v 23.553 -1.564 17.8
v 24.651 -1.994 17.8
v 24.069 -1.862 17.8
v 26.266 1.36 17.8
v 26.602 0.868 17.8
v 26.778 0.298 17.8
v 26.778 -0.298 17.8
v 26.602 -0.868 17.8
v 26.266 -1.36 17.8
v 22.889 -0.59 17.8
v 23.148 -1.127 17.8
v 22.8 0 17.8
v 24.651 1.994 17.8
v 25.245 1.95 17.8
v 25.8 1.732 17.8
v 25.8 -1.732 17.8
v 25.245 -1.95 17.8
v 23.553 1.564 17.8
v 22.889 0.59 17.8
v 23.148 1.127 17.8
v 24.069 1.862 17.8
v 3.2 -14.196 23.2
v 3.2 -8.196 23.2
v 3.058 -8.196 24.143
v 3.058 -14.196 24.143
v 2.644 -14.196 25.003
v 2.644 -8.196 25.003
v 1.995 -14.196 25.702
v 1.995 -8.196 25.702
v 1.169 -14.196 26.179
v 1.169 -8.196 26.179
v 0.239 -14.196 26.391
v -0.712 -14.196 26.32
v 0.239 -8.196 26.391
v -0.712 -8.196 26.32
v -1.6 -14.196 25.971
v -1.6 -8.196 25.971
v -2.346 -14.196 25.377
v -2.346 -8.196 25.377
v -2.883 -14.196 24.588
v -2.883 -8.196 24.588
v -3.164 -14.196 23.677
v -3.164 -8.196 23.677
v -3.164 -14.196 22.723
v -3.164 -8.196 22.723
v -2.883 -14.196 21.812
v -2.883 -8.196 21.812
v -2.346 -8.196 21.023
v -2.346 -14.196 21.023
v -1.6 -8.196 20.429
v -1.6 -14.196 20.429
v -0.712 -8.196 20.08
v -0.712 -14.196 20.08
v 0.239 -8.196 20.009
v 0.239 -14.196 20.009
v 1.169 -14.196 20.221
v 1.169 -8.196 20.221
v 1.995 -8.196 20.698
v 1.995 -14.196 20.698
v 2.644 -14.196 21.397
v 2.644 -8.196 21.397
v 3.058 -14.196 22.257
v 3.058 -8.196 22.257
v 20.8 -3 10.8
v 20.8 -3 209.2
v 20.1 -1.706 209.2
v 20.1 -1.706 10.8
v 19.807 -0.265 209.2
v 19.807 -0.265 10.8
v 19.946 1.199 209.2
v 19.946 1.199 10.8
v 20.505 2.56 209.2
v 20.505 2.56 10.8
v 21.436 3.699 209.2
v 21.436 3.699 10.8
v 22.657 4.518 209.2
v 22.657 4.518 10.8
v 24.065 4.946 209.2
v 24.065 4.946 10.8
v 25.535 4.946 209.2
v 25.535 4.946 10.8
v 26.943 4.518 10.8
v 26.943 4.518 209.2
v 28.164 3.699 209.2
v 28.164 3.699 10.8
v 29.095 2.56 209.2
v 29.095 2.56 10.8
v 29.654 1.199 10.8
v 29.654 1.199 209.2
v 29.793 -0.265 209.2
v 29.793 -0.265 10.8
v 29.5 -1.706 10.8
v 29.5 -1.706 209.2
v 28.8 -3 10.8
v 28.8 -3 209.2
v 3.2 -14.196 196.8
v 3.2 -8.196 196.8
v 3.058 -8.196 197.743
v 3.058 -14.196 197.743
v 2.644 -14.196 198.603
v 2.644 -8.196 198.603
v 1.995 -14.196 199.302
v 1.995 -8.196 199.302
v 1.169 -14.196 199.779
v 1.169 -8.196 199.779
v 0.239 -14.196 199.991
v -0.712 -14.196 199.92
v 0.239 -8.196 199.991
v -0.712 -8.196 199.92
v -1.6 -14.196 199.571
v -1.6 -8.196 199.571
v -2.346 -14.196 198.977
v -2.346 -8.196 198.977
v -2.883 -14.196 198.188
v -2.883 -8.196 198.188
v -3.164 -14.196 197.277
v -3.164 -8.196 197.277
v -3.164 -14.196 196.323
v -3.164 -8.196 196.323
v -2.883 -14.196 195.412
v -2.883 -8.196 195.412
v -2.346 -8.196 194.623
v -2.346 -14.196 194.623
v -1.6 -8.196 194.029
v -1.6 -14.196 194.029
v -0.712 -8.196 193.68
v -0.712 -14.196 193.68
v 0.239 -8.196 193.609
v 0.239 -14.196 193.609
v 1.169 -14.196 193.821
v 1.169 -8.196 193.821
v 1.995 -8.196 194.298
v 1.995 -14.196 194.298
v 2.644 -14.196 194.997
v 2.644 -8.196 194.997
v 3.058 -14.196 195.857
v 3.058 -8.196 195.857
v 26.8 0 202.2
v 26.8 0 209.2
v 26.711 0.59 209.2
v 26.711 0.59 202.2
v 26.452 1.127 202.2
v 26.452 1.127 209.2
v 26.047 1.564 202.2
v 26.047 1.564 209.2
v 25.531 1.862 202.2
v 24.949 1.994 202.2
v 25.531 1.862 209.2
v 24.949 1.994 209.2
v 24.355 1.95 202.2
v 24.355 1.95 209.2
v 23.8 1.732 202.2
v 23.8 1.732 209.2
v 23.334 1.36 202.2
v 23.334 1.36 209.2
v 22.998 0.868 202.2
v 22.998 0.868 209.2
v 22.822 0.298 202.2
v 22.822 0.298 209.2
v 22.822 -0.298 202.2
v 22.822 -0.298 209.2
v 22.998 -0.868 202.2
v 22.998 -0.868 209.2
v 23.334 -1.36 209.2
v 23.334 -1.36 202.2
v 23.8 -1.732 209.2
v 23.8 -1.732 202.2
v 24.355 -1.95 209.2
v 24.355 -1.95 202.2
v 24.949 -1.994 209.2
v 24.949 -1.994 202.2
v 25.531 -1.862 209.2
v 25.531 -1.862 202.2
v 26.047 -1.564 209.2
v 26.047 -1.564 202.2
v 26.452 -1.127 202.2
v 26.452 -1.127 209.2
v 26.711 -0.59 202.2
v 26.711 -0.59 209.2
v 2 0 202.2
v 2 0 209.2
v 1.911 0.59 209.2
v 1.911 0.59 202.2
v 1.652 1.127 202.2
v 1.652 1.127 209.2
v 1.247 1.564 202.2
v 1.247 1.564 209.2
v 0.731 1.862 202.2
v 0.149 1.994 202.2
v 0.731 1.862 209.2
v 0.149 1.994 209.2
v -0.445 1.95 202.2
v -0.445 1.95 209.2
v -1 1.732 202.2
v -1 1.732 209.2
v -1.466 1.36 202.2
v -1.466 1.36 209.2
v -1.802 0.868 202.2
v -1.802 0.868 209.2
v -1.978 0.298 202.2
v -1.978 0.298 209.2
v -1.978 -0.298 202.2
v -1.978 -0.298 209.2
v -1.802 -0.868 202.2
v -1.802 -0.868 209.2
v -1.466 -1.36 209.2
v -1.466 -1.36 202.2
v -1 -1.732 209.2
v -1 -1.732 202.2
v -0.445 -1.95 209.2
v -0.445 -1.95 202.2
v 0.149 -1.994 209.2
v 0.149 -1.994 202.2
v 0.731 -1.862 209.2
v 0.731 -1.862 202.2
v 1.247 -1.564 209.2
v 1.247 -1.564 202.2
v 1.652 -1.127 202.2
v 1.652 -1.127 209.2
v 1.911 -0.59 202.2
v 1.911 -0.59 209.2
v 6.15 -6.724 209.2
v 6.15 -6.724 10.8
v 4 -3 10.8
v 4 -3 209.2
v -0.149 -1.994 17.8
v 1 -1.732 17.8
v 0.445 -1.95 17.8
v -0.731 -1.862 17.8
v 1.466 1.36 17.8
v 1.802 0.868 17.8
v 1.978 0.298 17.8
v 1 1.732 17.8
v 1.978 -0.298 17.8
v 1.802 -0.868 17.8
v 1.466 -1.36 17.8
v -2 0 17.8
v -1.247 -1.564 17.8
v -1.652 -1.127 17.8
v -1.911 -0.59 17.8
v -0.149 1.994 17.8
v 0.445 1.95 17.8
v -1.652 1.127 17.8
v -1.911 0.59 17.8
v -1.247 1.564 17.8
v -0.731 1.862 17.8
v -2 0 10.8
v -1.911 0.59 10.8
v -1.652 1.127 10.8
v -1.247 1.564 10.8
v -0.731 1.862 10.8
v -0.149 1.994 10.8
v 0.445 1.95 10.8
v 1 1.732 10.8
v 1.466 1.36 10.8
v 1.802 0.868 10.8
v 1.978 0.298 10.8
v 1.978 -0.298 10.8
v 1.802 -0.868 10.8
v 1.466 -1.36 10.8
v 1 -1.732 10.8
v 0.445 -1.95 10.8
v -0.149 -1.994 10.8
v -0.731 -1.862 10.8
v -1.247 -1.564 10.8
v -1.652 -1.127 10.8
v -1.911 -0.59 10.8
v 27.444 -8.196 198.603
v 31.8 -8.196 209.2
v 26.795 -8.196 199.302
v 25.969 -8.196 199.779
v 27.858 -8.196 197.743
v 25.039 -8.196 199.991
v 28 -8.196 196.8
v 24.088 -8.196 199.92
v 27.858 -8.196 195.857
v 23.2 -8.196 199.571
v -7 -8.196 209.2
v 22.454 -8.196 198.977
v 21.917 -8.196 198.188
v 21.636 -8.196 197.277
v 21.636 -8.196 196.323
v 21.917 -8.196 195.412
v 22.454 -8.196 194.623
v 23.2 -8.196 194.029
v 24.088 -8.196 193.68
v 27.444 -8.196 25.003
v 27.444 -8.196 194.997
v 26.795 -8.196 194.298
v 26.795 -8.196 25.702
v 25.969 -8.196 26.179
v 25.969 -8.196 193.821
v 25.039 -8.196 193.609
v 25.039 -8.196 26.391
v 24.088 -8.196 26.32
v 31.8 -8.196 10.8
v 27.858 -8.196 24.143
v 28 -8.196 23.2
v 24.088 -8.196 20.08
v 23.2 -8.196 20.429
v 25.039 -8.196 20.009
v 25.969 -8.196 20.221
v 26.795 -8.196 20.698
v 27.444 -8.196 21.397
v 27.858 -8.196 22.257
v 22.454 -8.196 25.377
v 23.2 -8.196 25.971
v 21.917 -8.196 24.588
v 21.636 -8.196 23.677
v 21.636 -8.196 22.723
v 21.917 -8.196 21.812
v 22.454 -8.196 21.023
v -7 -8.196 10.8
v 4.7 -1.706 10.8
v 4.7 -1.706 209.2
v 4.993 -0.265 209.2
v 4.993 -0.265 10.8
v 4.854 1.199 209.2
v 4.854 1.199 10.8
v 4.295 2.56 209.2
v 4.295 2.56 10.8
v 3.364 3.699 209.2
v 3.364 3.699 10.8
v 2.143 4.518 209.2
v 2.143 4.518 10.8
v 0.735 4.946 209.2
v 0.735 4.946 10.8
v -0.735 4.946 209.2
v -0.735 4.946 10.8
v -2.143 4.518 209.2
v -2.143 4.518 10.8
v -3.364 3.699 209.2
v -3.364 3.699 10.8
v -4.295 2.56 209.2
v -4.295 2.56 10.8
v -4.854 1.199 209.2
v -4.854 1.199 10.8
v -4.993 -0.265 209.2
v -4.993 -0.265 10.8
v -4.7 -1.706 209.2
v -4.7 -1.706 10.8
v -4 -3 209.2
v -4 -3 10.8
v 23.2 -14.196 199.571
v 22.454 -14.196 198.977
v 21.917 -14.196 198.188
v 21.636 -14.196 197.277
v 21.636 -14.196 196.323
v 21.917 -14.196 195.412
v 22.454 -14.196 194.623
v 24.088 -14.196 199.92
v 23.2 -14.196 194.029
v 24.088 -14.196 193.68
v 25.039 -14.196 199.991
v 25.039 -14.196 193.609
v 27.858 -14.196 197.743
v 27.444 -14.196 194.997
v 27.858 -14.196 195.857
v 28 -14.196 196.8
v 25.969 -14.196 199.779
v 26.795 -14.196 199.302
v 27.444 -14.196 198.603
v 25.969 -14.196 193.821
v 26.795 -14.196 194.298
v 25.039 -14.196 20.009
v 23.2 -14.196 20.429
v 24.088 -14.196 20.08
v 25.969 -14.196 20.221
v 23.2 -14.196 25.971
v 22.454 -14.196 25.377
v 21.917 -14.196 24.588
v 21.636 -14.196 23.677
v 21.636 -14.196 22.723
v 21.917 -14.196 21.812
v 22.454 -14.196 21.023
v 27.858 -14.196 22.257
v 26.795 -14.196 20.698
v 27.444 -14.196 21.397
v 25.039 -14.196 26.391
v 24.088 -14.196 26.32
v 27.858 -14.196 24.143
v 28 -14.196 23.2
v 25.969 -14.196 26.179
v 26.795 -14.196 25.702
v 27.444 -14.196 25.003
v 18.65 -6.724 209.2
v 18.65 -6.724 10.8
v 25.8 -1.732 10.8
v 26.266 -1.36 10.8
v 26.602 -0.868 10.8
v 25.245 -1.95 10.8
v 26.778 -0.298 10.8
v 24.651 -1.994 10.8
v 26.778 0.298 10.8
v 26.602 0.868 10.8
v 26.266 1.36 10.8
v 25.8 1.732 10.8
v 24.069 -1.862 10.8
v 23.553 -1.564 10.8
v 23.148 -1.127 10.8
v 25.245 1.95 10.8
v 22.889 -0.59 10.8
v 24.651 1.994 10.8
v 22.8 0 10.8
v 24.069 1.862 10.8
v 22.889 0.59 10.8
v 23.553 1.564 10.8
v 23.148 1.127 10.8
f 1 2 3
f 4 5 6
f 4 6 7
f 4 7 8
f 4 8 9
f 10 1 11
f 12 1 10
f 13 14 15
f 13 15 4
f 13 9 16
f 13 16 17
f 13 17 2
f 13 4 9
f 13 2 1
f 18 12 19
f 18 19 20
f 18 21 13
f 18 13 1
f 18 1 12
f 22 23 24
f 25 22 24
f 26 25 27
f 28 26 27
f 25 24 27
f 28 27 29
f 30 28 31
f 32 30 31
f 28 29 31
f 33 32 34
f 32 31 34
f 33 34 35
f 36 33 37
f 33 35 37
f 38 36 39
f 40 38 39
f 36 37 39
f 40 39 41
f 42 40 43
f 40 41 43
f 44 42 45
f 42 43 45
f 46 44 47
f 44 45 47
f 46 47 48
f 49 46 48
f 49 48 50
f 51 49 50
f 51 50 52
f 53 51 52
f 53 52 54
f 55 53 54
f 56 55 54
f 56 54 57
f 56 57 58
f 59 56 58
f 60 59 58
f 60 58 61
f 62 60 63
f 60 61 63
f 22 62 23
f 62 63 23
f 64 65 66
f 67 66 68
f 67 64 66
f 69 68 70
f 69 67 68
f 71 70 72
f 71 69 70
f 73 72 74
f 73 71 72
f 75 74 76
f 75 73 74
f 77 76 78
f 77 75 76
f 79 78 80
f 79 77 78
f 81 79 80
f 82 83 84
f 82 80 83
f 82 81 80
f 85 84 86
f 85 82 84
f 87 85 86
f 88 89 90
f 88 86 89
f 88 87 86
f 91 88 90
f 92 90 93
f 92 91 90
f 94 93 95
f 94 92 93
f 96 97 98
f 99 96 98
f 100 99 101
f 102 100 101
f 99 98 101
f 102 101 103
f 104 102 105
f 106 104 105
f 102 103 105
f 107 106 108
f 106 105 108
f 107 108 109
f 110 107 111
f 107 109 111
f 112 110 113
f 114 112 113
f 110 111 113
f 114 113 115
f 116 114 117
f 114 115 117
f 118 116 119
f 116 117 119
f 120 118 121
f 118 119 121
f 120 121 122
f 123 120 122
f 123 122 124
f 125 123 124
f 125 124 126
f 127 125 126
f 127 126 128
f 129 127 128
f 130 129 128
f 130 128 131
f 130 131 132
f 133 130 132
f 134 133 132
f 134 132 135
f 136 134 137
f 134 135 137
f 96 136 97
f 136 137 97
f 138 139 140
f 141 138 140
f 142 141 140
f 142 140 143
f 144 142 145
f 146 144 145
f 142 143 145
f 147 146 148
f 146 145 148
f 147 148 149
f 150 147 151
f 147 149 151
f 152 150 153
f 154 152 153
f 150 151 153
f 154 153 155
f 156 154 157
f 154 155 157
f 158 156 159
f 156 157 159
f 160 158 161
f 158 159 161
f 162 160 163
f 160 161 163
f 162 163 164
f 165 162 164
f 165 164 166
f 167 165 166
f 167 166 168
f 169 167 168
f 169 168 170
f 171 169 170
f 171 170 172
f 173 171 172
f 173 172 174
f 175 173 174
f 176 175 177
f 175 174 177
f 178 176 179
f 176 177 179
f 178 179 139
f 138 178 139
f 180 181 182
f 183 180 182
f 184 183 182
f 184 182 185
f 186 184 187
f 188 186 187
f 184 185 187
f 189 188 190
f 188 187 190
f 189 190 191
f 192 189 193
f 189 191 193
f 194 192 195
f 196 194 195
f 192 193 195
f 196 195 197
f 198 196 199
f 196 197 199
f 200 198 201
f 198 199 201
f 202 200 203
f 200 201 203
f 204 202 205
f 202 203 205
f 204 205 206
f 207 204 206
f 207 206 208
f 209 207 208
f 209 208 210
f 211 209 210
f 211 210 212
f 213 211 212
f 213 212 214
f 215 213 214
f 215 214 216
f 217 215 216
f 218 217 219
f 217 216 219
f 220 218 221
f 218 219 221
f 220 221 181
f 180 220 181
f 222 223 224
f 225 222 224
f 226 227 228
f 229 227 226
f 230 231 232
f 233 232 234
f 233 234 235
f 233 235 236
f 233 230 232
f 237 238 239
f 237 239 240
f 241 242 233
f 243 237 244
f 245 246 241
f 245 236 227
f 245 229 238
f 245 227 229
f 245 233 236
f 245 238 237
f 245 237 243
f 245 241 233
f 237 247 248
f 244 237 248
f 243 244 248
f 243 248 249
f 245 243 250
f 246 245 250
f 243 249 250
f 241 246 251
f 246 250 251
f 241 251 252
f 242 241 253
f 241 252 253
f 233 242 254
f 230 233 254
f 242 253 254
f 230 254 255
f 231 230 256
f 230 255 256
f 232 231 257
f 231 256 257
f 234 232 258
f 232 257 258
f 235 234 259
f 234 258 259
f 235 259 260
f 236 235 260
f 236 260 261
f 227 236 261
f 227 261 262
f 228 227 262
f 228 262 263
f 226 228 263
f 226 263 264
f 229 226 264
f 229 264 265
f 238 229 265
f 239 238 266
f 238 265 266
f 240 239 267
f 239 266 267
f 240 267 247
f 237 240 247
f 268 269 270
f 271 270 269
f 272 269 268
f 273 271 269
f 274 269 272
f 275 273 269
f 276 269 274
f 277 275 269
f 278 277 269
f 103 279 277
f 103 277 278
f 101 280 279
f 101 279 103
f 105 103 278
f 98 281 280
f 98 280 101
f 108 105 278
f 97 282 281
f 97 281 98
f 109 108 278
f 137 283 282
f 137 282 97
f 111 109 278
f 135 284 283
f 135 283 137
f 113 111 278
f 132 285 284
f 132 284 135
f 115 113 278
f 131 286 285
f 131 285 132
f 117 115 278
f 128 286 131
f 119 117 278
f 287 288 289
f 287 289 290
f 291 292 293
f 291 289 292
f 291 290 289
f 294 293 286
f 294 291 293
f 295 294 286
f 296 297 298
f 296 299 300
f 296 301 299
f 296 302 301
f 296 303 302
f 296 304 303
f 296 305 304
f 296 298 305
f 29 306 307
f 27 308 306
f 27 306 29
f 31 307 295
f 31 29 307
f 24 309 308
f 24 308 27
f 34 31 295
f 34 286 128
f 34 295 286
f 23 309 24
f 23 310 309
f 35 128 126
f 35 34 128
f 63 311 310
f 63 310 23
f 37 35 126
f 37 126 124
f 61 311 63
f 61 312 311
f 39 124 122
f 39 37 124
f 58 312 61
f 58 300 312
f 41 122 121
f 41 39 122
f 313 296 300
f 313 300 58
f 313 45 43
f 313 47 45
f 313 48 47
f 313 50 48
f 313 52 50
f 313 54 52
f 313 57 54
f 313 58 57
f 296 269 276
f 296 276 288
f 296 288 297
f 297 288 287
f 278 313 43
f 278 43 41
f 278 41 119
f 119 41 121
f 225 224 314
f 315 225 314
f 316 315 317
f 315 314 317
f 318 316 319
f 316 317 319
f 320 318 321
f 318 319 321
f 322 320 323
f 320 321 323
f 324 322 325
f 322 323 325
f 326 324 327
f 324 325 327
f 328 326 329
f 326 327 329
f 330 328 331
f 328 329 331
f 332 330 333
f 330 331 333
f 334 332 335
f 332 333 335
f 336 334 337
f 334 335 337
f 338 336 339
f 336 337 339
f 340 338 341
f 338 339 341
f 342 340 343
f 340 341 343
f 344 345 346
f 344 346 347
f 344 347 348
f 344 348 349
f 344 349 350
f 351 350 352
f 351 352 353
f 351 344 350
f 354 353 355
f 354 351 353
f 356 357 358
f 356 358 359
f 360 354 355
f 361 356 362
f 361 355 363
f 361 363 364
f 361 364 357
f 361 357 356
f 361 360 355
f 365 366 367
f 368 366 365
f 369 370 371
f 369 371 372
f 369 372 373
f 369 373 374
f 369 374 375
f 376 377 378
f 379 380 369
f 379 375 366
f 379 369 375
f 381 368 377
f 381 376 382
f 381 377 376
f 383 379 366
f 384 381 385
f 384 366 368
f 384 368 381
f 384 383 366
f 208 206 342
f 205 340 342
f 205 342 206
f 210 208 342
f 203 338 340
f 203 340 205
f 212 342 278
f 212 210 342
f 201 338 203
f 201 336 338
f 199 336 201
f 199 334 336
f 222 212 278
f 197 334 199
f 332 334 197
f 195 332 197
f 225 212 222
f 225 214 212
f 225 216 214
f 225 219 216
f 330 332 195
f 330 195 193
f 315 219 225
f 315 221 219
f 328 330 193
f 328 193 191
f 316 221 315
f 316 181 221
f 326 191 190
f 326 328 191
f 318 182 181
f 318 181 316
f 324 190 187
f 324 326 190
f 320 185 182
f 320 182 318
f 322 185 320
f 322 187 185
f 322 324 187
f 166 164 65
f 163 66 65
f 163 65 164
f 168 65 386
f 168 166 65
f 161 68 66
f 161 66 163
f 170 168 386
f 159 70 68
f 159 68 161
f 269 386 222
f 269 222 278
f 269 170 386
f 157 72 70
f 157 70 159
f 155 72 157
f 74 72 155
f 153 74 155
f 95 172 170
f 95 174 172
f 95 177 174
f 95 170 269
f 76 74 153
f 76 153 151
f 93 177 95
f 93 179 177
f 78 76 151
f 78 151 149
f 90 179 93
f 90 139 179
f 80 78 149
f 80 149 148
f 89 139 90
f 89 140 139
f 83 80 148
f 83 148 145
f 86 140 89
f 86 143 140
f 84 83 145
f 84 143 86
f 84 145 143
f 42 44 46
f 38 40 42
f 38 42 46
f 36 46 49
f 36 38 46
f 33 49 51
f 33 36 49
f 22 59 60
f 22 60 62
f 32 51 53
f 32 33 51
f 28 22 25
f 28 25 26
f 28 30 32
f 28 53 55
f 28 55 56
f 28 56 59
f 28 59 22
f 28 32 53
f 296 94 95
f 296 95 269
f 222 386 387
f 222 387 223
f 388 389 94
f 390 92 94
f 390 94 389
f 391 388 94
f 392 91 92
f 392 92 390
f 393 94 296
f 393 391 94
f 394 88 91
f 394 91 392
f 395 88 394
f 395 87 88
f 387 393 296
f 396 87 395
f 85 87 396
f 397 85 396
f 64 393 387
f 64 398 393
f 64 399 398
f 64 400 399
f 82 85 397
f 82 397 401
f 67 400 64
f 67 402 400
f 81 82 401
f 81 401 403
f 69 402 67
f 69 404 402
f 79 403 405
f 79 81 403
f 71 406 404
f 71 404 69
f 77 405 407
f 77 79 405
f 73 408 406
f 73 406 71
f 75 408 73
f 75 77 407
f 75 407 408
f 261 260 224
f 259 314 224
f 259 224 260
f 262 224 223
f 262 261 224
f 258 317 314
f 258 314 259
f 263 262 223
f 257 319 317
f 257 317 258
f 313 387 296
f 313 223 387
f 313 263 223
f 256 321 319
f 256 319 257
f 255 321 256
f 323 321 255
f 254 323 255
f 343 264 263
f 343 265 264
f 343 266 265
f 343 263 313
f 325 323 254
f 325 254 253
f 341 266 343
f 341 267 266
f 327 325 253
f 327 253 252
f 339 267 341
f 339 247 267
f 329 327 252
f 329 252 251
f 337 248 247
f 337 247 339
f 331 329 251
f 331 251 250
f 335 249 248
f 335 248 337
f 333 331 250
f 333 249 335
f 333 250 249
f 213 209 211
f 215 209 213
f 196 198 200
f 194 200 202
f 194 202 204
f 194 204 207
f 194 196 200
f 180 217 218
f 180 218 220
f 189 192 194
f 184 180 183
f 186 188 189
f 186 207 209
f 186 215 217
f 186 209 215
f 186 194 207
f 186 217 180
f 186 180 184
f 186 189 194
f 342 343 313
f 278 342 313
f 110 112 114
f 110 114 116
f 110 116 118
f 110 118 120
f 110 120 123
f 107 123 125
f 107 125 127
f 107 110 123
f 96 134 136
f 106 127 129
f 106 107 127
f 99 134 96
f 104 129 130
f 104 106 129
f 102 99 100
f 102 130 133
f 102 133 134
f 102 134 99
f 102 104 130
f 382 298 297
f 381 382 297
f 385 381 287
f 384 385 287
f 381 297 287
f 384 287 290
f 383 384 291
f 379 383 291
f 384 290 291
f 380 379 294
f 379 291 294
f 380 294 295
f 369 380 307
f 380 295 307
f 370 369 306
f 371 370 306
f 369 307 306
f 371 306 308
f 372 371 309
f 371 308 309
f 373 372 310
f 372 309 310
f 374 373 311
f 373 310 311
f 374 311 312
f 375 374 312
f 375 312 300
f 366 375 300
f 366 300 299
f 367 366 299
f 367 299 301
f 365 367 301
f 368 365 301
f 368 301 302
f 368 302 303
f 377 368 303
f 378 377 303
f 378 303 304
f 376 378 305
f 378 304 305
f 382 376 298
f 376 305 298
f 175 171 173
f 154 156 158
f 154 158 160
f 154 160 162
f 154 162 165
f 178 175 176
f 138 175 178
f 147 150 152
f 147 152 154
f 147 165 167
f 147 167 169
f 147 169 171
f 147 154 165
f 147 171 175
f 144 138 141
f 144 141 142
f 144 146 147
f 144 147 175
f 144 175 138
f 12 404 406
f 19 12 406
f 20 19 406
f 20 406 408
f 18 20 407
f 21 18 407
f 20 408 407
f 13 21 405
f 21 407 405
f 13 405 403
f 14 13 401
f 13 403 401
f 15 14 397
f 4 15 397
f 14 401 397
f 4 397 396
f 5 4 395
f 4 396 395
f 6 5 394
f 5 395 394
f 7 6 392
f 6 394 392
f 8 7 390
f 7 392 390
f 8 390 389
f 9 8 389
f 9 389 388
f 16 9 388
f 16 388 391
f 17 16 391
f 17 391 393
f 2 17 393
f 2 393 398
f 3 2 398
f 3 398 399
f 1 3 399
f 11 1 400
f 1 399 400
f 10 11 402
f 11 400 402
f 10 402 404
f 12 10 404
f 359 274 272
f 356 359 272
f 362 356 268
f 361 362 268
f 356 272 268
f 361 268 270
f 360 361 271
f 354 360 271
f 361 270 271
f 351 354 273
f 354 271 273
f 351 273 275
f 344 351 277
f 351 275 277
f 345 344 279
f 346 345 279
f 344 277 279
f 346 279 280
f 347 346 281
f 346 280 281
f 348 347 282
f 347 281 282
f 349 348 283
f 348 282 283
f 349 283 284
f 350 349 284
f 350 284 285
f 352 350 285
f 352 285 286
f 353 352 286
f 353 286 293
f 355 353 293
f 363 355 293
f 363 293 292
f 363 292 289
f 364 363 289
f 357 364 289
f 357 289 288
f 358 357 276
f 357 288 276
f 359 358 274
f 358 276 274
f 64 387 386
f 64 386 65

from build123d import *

# Parameters (mm, degrees)
SKETCH1_R           = 5
BOSS_EXTRUDE1_DEPTH = 220
SKETCH4_R           = 3.2
BOSS_EXTRUDE3_DEPTH = 6
BOSS_EXTRUDE4_DEPTH = 220
SKETCH5_R           = 1.37
CUT_EXTRUDE1_DEPTH  = 7
SKETCH6_R           = 1.37
CUT_EXTRUDE2_DEPTH  = 7
SKETCH7_R           = 3.2
CUT_EXTRUDE3_DEPTH  = 6
CUT_EXTRUDE4_DEPTH  = 10.8
CUT_EXTRUDE5_DEPTH  = 10.8
SKETCH11_R          = 2
CUT_EXTRUDE6_DEPTH  = 7
SKETCH12_R          = 2
CUT_EXTRUDE7_DEPTH  = 7


with BuildPart() as part:
    # Sketch1 → Boss-Extrude1 (new body)
    with BuildSketch(Plane.XY):
        Circle(SKETCH1_R)
        with BuildLine():
            Line((-4, -3), (-7, -8.196152423))
            Line((-7, -8.196152423), (7, -8.196152423))
            Line((7, -8.196152423), (4, -3))
            ThreePointArc((4, -3), (0, 5), (-4, -3))
        make_face()
        with BuildLine():
            Line((28.8, -3), (31.8, -8.196152423))
            Line((31.8, -8.196152423), (17.8, -8.196152423))
            Line((17.8, -8.196152423), (20.8, -3))
            ThreePointArc((20.8, -3), (24.8, 5), (28.8, -3))
        make_face()
    extrude(amount=BOSS_EXTRUDE1_DEPTH)

    # Sketch4 → Boss-Extrude3 (add)
    with BuildSketch(Plane.XZ.offset(8.196152423)):
        with Locations((0, 196.8)):
            Circle(SKETCH4_R)
        with Locations((24.8, 196.8)):
            Circle(SKETCH4_R)
        with Locations((24.8, 172)):
            Circle(SKETCH4_R)
        with Locations((24.8, 147.2)):
            Circle(SKETCH4_R)
        with Locations((24.8, 122.4)):
            Circle(SKETCH4_R)
        with Locations((24.8, 97.6)):
            Circle(SKETCH4_R)
        with Locations((24.8, 72.8)):
            Circle(SKETCH4_R)
        with Locations((24.8, 48)):
            Circle(SKETCH4_R)
        with Locations((24.8, 23.2)):
            Circle(SKETCH4_R)
        with Locations((0, 172)):
            Circle(SKETCH4_R)
        with Locations((0, 147.2)):
            Circle(SKETCH4_R)
        with Locations((0, 122.4)):
            Circle(SKETCH4_R)
        with Locations((0, 97.6)):
            Circle(SKETCH4_R)
        with Locations((0, 72.8)):
            Circle(SKETCH4_R)
        with Locations((0, 48)):
            Circle(SKETCH4_R)
        with Locations((0, 23.2)):
            Circle(SKETCH4_R)
    extrude(amount=BOSS_EXTRUDE3_DEPTH)

    # Sketch3 → Boss-Extrude4 (add)
    with BuildSketch(Plane.XY.offset(220)):
        Polygon((7, -8.196152423), (17.8, -8.196152423), (18.65, -8.196152423), (18.65, -6.723909236), (6.15, -6.723909236), (6.15, -8.196152423), align=None)
    extrude(amount=-BOSS_EXTRUDE4_DEPTH)

    # Sketch5 → Cut-Extrude1 (cut)
    with BuildSketch(Plane(origin=(0, 0, 0), x_dir=(-1, 0, 0), z_dir=(0, 0, -1))):
        Circle(SKETCH5_R)
        with Locations((-24.8, 0)):
            Circle(SKETCH5_R)
    extrude(amount=-CUT_EXTRUDE1_DEPTH, mode=Mode.SUBTRACT)

    # Sketch6 → Cut-Extrude2 (cut)
    with BuildSketch(Plane.XY.offset(220)):
        Circle(SKETCH6_R)
        with Locations((24.8, 0)):
            Circle(SKETCH6_R)
    extrude(amount=-CUT_EXTRUDE2_DEPTH, mode=Mode.SUBTRACT)

    # Sketch7 → Cut-Extrude3 (cut)
    with BuildSketch(Plane.XZ.offset(14.196152423)):
        with Locations((0, 172)):
            Circle(SKETCH7_R)
        with Locations((24.8, 172)):
            Circle(SKETCH7_R)
        with Locations((24.8, 147.2)):
            Circle(SKETCH7_R)
        with Locations((24.8, 122.4)):
            Circle(SKETCH7_R)
        with Locations((24.8, 97.6)):
            Circle(SKETCH7_R)
        with Locations((24.8, 72.8)):
            Circle(SKETCH7_R)
        with Locations((24.8, 48)):
            Circle(SKETCH7_R)
        with Locations((0, 147.2)):
            Circle(SKETCH7_R)
        with Locations((0, 122.4)):
            Circle(SKETCH7_R)
        with Locations((0, 97.6)):
            Circle(SKETCH7_R)
        with Locations((0, 72.8)):
            Circle(SKETCH7_R)
        with Locations((0, 48)):
            Circle(SKETCH7_R)
    extrude(amount=-CUT_EXTRUDE3_DEPTH, mode=Mode.SUBTRACT)

    # Sketch9 → Cut-Extrude4 (cut)
    with BuildSketch(Plane(origin=(0, 0, 0), x_dir=(-1, 0, 0), z_dir=(0, 0, -1))):
        with BuildLine():
            Line((-28.8, -3), (-31.8, -8.196152423))
            Line((-31.8, -8.196152423), (7, -8.196152423))
            Line((7, -8.196152423), (4, -3))
            ThreePointArc((4, -3), (0, 5), (-4, -3))
            Line((-4, -3), (-6.15, -6.723909236))
            Line((-6.15, -6.723909236), (-18.65, -6.723909236))
            Line((-18.65, -6.723909236), (-20.8, -3))
            ThreePointArc((-20.8, -3), (-24.8, 5), (-28.8, -3))
        make_face()
    extrude(amount=-CUT_EXTRUDE4_DEPTH, mode=Mode.SUBTRACT)

    # Sketch10 → Cut-Extrude5 (cut)
    with BuildSketch(Plane.XY.offset(220)):
        with BuildLine():
            Line((20.8, -3), (18.65, -6.723909236))
            Line((18.65, -6.723909236), (6.15, -6.723909236))
            Line((6.15, -6.723909236), (4, -3))
            ThreePointArc((4, -3), (0, 5), (-4, -3))
            Line((-4, -3), (-7, -8.196152423))
            Line((-7, -8.196152423), (31.8, -8.196152423))
            Line((31.8, -8.196152423), (28.8, -3))
            ThreePointArc((28.8, -3), (24.8, 5), (20.8, -3))
        make_face()
    extrude(amount=-CUT_EXTRUDE5_DEPTH, mode=Mode.SUBTRACT)

    # Sketch11 → Cut-Extrude6 (cut)
    with BuildSketch(Plane.XY.offset(209.2)):
        Circle(SKETCH11_R)
        with Locations((24.8, 0)):
            Circle(SKETCH11_R)
    extrude(amount=-CUT_EXTRUDE6_DEPTH, mode=Mode.SUBTRACT)

    # Sketch12 → Cut-Extrude7 (cut)
    with BuildSketch(Plane(origin=(0, 0, 10.8), x_dir=(-1, 0, 0), z_dir=(0, 0, -1))):
        Circle(SKETCH12_R)
        with Locations((-24.8, 0)):
            Circle(SKETCH12_R)
    extrude(amount=-CUT_EXTRUDE7_DEPTH, mode=Mode.SUBTRACT)


solid = part.part
